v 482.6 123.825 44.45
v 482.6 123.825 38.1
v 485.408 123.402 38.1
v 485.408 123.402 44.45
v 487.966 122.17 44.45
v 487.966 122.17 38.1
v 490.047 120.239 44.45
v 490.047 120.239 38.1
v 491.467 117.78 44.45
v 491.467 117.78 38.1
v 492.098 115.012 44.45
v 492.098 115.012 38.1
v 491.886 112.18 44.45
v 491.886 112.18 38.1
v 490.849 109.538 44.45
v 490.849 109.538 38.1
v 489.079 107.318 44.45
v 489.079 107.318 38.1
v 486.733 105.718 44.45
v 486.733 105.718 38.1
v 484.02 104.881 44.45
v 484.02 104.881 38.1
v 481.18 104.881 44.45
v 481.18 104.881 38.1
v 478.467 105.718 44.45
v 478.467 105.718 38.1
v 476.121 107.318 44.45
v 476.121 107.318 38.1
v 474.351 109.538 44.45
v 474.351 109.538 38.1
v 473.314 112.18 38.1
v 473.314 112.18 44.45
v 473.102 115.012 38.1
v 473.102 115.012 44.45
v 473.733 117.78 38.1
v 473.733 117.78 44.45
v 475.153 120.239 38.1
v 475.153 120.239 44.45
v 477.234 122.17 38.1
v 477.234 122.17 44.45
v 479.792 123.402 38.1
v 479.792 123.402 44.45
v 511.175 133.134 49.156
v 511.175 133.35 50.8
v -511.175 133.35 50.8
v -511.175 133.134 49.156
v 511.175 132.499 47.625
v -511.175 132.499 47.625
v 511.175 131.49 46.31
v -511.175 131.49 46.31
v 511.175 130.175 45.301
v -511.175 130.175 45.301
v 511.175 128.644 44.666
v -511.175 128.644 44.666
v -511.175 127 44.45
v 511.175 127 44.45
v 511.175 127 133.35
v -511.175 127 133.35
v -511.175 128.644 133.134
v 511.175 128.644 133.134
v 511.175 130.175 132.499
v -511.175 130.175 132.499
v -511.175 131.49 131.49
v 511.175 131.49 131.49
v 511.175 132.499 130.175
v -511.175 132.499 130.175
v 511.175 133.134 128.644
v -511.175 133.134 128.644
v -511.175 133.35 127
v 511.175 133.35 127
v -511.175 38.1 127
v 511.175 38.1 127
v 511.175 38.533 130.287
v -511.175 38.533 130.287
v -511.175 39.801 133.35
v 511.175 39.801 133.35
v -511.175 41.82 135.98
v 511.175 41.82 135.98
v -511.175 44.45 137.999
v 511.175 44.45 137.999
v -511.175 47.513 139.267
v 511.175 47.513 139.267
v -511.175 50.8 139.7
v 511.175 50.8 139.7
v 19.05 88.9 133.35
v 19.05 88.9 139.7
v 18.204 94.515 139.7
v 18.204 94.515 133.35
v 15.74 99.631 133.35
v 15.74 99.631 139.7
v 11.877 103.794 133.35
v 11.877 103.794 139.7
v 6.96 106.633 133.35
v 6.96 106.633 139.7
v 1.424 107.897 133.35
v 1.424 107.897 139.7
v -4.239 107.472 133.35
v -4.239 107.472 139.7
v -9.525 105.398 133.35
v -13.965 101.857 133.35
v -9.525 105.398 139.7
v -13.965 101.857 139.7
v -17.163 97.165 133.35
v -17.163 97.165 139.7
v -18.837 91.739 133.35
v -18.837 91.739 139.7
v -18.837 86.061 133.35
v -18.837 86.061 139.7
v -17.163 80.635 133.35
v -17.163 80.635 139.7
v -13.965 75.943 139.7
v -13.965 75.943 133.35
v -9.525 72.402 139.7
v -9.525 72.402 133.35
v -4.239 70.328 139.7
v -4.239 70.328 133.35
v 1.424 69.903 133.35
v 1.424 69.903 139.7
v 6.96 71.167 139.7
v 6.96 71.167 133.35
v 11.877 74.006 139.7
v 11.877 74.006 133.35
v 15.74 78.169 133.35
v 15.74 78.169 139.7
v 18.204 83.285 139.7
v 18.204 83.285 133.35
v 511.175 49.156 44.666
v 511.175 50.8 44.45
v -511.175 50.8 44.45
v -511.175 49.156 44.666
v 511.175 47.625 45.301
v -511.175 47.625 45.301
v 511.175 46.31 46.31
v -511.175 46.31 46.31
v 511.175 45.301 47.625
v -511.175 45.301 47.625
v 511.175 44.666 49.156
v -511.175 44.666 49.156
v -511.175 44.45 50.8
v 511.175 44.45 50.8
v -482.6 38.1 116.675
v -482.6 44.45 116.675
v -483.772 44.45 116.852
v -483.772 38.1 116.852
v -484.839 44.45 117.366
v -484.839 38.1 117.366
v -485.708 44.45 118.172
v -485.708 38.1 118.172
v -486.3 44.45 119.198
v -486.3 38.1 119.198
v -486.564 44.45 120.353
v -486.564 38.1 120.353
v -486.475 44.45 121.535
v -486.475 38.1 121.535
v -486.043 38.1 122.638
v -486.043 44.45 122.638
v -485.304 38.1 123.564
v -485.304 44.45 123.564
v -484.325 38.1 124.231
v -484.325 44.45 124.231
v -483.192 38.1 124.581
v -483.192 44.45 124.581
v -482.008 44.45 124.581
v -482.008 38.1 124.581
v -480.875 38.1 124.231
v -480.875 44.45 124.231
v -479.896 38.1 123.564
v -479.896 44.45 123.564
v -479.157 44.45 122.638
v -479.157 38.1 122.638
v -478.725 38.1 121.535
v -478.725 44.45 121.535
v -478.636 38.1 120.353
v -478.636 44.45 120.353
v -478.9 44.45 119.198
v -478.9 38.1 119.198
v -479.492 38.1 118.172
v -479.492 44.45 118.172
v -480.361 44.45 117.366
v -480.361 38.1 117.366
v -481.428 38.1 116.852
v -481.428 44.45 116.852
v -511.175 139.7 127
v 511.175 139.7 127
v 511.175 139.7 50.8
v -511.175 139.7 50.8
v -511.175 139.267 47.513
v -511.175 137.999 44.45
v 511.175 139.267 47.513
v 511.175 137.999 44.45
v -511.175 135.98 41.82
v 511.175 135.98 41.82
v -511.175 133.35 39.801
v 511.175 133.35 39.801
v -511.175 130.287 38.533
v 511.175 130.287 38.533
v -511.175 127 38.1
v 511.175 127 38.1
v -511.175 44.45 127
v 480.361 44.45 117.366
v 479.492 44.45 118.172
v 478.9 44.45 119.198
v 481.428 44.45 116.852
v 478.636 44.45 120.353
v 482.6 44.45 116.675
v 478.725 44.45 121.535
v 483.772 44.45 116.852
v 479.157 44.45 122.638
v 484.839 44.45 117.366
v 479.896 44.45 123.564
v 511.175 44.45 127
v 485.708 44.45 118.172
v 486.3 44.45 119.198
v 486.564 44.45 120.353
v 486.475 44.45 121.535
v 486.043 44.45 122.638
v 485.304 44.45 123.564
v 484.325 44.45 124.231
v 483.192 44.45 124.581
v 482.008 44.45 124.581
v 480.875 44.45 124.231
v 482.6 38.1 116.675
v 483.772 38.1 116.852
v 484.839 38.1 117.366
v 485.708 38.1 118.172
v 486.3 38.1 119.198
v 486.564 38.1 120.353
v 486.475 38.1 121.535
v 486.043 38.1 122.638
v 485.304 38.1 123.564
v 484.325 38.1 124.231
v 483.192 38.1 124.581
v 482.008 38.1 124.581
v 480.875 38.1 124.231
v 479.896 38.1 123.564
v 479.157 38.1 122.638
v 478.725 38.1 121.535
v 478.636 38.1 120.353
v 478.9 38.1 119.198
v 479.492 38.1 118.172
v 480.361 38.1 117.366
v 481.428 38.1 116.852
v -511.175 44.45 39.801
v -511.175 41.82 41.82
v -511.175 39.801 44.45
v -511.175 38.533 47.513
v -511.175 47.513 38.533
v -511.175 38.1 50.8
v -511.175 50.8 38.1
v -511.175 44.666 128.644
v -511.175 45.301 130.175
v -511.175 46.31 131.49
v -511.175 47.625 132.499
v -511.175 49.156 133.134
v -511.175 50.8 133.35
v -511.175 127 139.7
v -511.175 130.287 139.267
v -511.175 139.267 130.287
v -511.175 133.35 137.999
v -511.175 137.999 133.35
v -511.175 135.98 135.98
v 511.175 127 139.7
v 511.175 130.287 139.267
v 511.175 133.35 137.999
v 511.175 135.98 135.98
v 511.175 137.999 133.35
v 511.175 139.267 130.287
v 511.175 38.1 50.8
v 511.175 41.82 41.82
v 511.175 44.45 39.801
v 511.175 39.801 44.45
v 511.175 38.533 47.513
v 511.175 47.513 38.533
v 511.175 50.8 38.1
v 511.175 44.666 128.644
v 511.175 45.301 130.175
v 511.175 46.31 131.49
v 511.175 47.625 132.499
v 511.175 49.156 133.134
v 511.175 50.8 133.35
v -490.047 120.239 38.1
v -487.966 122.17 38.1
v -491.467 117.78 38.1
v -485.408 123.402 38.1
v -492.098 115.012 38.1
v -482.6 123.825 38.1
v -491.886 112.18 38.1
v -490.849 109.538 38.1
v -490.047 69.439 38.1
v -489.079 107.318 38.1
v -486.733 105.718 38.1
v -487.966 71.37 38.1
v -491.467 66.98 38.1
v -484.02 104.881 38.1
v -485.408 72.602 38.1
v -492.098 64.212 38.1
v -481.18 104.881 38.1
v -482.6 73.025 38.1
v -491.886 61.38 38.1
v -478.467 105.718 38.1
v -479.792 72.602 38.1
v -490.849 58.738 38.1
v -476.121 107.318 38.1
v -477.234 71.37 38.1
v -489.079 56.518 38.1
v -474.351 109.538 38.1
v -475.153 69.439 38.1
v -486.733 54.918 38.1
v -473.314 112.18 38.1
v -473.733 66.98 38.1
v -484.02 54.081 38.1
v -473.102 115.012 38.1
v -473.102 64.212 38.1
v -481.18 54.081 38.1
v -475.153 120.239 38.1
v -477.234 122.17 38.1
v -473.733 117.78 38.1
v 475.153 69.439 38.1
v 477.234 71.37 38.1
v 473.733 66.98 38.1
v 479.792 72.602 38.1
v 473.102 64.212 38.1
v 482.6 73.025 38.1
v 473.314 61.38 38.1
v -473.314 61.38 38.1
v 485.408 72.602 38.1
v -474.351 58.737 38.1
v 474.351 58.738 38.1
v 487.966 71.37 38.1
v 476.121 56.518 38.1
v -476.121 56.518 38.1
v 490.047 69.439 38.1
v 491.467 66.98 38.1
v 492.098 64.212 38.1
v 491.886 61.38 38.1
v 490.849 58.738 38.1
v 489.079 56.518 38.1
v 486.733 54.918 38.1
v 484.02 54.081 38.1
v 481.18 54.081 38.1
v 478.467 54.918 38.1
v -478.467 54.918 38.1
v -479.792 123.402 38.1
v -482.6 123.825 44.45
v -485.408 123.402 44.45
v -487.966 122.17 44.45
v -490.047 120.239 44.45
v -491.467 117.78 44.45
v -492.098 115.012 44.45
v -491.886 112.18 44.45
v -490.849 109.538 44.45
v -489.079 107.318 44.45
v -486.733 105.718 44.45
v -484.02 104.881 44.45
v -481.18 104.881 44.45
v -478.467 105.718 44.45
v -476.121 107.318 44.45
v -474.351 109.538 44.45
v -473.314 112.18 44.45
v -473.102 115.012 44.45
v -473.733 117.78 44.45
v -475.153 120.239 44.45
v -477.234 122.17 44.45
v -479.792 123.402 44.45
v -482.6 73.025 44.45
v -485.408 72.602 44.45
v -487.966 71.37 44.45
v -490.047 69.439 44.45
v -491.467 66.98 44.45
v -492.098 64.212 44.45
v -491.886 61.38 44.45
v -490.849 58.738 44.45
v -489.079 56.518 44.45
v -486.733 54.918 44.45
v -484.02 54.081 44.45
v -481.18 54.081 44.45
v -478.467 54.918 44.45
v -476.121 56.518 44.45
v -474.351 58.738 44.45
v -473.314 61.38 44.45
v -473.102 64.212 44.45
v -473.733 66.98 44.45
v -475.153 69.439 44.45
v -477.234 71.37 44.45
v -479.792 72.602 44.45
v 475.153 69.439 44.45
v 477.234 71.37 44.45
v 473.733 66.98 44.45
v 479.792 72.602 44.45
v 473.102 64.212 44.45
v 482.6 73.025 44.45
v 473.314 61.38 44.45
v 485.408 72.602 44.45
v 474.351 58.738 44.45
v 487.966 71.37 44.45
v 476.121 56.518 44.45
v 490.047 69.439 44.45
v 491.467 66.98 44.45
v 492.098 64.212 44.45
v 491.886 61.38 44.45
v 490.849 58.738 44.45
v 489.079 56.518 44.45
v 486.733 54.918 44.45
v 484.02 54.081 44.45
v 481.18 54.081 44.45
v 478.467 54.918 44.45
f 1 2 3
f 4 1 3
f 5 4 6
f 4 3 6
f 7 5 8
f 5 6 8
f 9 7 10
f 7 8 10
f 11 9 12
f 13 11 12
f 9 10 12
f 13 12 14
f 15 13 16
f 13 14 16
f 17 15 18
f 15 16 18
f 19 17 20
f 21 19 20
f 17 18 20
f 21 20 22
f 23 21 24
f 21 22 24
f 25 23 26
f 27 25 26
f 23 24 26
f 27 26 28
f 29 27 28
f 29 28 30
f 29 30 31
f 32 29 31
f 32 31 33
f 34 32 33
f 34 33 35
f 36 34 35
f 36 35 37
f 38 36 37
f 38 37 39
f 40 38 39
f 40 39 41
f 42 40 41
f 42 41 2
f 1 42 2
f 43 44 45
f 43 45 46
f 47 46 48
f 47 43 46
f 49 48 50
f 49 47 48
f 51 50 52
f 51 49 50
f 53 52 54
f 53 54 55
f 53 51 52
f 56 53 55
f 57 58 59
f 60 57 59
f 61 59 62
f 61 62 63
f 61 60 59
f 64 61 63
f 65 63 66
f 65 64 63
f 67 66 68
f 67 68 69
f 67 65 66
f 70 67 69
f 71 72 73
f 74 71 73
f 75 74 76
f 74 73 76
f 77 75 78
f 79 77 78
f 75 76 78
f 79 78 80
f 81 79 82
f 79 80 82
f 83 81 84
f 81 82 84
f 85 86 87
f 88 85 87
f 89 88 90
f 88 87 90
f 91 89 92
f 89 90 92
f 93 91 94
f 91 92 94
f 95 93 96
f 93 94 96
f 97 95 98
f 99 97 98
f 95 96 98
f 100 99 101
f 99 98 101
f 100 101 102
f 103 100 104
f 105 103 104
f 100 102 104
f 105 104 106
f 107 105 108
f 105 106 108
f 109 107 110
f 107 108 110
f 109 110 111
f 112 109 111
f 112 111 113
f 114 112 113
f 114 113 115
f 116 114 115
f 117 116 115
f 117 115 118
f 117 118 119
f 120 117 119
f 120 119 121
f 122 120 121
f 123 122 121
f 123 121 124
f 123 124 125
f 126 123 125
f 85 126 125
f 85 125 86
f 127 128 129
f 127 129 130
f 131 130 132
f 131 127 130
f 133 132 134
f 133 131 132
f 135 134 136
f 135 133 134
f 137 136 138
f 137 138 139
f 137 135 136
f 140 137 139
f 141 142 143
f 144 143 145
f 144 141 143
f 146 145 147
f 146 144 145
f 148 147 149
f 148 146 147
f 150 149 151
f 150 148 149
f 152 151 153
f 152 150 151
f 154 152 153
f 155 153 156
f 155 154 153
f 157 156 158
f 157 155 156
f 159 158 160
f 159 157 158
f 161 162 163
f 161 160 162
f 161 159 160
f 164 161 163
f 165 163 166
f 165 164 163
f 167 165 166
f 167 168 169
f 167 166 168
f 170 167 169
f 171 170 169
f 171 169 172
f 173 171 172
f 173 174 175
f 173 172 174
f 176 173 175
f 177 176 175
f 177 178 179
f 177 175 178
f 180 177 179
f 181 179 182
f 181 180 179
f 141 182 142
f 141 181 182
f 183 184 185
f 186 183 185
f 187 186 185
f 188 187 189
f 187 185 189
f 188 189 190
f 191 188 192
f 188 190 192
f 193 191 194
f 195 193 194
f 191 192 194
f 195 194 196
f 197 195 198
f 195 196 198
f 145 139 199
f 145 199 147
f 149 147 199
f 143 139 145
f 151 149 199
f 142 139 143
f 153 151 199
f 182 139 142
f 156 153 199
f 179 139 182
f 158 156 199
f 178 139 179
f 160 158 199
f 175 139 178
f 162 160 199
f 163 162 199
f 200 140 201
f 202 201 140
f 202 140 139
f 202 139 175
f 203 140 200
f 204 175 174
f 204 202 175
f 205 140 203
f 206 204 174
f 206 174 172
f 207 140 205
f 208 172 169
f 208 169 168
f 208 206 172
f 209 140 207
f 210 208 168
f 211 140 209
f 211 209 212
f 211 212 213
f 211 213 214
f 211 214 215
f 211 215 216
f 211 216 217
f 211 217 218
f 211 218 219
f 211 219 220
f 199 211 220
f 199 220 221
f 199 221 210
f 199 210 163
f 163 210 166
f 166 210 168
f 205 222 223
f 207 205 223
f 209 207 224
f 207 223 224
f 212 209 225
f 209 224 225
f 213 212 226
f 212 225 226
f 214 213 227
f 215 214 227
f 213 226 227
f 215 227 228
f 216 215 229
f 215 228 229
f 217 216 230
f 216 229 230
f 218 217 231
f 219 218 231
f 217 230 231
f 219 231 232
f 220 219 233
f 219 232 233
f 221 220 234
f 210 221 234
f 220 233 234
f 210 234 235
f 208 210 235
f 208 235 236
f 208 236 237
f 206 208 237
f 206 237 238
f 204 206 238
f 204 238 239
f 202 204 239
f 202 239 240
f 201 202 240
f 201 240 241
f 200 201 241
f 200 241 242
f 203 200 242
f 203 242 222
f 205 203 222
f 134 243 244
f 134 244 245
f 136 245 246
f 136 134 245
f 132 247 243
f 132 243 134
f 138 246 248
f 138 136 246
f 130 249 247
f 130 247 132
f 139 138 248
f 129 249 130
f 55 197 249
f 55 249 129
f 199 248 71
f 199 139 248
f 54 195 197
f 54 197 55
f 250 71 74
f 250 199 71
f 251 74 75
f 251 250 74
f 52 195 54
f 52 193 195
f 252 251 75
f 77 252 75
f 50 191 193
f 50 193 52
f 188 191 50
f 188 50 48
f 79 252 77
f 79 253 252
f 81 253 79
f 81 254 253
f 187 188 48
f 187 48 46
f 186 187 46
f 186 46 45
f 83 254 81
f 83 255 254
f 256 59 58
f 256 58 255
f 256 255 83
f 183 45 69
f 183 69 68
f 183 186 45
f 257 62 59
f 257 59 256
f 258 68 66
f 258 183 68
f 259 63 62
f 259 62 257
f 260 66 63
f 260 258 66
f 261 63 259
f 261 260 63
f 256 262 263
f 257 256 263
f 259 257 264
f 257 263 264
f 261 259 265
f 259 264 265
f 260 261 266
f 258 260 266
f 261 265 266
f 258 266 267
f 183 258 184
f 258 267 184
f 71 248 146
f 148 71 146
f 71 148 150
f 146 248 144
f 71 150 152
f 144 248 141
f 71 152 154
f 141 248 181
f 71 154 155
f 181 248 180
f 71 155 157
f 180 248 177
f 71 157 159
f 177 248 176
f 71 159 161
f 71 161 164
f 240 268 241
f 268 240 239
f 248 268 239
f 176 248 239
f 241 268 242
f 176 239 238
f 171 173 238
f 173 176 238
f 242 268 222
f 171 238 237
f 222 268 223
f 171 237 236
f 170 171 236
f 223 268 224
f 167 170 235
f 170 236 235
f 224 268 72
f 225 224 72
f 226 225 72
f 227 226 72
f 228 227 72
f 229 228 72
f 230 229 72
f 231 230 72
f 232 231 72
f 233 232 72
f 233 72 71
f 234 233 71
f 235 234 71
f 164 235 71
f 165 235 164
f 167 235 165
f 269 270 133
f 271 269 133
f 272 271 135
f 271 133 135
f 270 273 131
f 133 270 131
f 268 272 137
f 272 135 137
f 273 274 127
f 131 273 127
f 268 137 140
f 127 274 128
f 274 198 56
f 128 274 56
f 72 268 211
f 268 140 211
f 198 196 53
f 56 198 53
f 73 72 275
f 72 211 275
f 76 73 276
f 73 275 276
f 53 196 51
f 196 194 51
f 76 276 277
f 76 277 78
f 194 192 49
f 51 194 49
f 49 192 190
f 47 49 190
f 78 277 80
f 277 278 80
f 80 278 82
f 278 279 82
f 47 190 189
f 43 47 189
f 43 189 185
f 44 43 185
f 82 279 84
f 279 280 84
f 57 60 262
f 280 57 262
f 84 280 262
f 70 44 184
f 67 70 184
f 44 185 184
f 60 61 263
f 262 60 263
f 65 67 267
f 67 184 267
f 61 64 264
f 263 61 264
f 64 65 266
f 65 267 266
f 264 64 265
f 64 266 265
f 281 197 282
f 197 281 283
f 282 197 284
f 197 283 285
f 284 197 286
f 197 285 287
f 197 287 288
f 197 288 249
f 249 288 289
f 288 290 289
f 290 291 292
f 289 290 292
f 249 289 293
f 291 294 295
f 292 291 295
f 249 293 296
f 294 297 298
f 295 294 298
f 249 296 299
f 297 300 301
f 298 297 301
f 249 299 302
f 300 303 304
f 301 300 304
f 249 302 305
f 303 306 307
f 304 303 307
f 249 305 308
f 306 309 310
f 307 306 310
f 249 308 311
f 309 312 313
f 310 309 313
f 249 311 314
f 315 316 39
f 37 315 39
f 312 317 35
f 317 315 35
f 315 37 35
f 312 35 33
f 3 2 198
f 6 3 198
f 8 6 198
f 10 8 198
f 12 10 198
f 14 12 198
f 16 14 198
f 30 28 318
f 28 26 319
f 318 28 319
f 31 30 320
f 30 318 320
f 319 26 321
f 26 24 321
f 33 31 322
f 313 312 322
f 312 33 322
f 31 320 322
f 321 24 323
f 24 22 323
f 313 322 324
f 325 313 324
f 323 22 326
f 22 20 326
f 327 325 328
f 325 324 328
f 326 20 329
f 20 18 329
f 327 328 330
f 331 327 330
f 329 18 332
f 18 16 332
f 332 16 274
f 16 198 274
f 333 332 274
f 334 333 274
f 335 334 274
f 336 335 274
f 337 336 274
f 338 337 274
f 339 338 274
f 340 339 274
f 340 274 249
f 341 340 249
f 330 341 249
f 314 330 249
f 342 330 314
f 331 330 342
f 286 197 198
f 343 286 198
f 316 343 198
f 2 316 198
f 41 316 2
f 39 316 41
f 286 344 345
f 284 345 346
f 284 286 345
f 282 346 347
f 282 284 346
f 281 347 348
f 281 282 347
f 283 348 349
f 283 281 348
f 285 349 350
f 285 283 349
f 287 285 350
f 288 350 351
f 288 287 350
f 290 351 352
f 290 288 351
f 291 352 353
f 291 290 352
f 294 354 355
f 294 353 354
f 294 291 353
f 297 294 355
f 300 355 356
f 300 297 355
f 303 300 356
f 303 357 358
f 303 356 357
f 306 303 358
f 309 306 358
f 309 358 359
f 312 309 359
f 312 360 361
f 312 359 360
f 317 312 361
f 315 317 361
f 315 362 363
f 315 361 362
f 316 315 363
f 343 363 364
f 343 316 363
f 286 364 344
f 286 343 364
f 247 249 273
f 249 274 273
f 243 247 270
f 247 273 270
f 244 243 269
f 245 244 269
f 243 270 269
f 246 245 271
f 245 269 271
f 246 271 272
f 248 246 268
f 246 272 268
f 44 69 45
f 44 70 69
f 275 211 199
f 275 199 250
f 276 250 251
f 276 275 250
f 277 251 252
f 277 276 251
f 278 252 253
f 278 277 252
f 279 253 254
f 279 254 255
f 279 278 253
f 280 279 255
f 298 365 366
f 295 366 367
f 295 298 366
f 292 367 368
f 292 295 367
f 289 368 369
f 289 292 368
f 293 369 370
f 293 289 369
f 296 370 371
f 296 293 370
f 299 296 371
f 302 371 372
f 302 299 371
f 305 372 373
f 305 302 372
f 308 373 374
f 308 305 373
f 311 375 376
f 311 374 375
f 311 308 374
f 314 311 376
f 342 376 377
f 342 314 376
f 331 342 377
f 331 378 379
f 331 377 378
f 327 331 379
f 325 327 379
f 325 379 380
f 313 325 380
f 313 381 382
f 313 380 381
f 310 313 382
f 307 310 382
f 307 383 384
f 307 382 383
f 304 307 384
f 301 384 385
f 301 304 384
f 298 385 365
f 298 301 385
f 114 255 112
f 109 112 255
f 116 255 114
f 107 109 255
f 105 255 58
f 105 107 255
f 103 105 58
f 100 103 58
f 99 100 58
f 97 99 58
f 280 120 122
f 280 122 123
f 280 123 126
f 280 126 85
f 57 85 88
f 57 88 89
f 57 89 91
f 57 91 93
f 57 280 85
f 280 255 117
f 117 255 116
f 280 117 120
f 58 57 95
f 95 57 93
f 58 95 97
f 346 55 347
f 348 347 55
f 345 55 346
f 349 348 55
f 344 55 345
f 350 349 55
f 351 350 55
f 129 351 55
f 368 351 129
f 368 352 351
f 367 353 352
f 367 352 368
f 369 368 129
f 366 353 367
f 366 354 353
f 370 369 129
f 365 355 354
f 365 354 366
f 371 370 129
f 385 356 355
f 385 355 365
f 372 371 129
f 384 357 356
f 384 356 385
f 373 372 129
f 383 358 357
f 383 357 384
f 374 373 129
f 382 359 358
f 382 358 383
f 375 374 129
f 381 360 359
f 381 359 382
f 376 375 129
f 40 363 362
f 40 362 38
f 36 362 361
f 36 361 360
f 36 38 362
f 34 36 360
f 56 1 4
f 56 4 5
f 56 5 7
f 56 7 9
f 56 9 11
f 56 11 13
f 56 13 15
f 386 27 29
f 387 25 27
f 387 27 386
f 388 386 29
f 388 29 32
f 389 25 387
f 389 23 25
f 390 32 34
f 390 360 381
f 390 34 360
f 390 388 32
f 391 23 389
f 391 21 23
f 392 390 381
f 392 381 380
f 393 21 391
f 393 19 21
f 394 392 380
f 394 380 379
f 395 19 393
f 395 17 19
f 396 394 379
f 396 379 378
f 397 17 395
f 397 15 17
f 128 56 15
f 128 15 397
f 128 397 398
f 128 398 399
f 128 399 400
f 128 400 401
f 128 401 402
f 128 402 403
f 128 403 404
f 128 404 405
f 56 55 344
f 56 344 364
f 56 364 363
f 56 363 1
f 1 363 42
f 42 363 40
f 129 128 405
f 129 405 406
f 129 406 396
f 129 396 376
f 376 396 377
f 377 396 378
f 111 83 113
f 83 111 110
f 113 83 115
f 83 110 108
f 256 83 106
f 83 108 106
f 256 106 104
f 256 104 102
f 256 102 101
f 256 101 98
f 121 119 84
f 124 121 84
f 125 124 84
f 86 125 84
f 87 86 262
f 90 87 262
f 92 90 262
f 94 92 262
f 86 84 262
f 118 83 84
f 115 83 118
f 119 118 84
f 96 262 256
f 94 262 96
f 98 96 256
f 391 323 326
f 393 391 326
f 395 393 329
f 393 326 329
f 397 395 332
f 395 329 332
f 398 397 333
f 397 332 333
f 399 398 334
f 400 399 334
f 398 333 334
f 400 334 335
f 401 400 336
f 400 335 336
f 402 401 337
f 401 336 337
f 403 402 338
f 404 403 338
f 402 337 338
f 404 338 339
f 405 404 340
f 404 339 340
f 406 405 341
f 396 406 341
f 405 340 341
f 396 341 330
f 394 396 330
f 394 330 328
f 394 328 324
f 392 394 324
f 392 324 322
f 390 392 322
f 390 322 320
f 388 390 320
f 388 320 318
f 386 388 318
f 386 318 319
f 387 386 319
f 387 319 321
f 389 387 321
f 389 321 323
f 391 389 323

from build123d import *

# Parameters (mm, degrees)
BASE_EXTRUDE_DEPTH = 511.175
SKETCH3_R          = 19.05
CUT_EXTRUDE1_DEPTH = 25.4
SKETCH4_R          = 9.525
CUT_EXTRUDE2_DEPTH = 25.4
SKETCH5_R          = 3.9751
CUT_EXTRUDE3_DEPTH = 25.4


with BuildPart() as part:
    # Sketch1 → Base-Extrude (new, symmetric)
    with BuildSketch(Plane(origin=(0, 0, 0), x_dir=(0, 0, -1), z_dir=(1, 0, 0))):
        with BuildLine():
            Line((-127, 139.7), (-50.8, 139.7))
            ThreePointArc((-50.8, 139.7), (-41.819743879, 135.980256121), (-38.1, 127))
            Line((-38.1, 127), (-38.1, 50.8))
            ThreePointArc((-38.1, 50.8), (-41.819743879, 41.819743879), (-50.8, 38.1))
            Line((-50.8, 38.1), (-127, 38.1))
            ThreePointArc((-127, 38.1), (-135.980256121, 41.819743879), (-139.7, 50.8))
            Line((-139.7, 50.8), (-139.7, 127))
            ThreePointArc((-139.7, 127), (-135.980256121, 135.980256121), (-127, 139.7))
        make_face()
        with BuildLine():
            Line((-127, 133.35), (-50.8, 133.35))
            ThreePointArc((-50.8, 133.35), (-46.309871939, 131.490128061), (-44.45, 127))
            Line((-44.45, 127), (-44.45, 50.8))
            ThreePointArc((-44.45, 50.8), (-46.309871939, 46.309871939), (-50.8, 44.45))
            Line((-50.8, 44.45), (-127, 44.45))
            ThreePointArc((-127, 44.45), (-131.490128061, 46.309871939), (-133.35, 50.8))
            Line((-133.35, 50.8), (-133.35, 127))
            ThreePointArc((-133.35, 127), (-131.490128061, 131.490128061), (-127, 133.35))
        make_face(mode=Mode.SUBTRACT)
    extrude(amount=BASE_EXTRUDE_DEPTH, both=True)

    # Sketch3 → Cut-Extrude1 (cut)
    with BuildSketch(Plane.XY.offset(139.7)):
        with Locations((0, 88.9)):
            Circle(SKETCH3_R)
    extrude(amount=-CUT_EXTRUDE1_DEPTH, mode=Mode.SUBTRACT)

    # Sketch4 → Cut-Extrude2 (cut)
    with BuildSketch(Plane(origin=(0, 0, 38.1), x_dir=(-1, 0, 0), z_dir=(0, 0, -1))):
        with Locations(Location((-482.6, 63.5, 0), (0, 0, 90))):
            Circle(SKETCH4_R)
        with Locations(Location((-482.6, 114.3, 0), (0, 0, 90))):
            Circle(SKETCH4_R)
    cut_extrude2 = extrude(amount=-CUT_EXTRUDE2_DEPTH, mode=Mode.SUBTRACT)

    # Sketch5 → Cut-Extrude3 (cut)
    with BuildSketch(Plane.XZ.offset(-38.1)):
        with Locations(Location((482.6, 120.65, 0), (0, 0, 270))):
            Circle(SKETCH5_R)
    cut_extrude3 = extrude(amount=-CUT_EXTRUDE3_DEPTH, mode=Mode.SUBTRACT)

    # Mirror1: Cut-Extrude2, Cut-Extrude3 across plane
    add(cut_extrude2.mirror(Plane(origin=(0, 0, 0), x_dir=(0, 0, 1), z_dir=(1, 0, 0))), mode=Mode.SUBTRACT)
    add(cut_extrude3.mirror(Plane(origin=(0, 0, 0), x_dir=(0, 0, 1), z_dir=(1, 0, 0))), mode=Mode.SUBTRACT)


solid = part.part
